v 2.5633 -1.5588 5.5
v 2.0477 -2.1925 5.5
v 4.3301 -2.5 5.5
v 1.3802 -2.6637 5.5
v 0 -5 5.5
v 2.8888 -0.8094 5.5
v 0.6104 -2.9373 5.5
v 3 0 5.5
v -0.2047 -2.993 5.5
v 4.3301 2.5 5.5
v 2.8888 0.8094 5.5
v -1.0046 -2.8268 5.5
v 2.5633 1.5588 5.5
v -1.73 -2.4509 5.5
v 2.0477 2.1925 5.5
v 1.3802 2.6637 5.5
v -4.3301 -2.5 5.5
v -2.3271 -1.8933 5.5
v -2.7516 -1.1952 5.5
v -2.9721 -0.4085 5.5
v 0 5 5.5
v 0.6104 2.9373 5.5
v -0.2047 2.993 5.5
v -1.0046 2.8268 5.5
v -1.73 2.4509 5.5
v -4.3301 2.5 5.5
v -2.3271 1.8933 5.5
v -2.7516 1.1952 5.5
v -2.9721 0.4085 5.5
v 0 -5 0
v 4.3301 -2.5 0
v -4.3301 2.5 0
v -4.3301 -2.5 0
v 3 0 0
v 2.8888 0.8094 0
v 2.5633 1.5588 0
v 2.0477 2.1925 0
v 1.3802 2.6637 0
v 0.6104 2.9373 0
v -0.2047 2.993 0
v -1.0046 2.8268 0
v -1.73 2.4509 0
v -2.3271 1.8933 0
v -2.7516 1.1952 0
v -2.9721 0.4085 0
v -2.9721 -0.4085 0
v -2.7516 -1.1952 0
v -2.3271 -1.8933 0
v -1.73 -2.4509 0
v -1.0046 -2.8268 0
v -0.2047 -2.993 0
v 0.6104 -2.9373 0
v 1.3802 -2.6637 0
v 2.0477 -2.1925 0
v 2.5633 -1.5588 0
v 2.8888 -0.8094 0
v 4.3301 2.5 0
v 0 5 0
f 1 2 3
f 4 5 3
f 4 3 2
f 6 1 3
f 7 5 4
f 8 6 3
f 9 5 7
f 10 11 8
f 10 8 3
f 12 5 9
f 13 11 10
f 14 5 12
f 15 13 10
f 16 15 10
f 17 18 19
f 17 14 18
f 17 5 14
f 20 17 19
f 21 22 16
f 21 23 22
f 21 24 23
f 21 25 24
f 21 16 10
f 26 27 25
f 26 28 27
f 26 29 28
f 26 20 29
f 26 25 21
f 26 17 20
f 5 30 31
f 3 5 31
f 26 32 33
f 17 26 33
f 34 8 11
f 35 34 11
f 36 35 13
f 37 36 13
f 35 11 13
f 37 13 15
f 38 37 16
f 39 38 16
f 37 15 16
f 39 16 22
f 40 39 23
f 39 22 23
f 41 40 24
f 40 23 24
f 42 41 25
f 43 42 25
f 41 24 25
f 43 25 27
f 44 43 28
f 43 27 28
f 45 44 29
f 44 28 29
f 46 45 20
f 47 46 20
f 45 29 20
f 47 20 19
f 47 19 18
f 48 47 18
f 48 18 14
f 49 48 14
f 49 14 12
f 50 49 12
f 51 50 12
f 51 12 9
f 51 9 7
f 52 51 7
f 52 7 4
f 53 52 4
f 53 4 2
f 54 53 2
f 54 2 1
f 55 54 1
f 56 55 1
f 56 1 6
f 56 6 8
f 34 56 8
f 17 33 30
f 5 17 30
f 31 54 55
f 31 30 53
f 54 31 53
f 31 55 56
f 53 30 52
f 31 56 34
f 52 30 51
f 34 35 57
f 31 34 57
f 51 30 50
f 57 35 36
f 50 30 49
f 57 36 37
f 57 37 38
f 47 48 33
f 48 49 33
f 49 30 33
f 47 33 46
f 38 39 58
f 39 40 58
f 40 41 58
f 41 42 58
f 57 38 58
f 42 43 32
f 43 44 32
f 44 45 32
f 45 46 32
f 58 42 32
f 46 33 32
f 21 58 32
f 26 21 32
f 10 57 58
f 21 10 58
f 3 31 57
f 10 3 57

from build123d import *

# Parameters (mm, degrees)
BOSS_EXTRUDE1_DEPTH = 5.5
CUT_EXTRUDE1_REACH  = 10.602
SKETCH2_R           = 3


with BuildPart() as part:
    # Sketch1 → Boss-Extrude1 (new body)
    with BuildSketch(Plane(origin=(0, 0, 0), x_dir=(0, 1, 0), z_dir=(0, 0, 1))):
        Polygon((5, 0), (2.5, 4.330127019), (-2.5, 4.330127019), (-5, 0), (-2.5, -4.330127019), (2.5, -4.330127019), align=None)
    extrude(amount=BOSS_EXTRUDE1_DEPTH)

    # Sketch2 → Cut-Extrude1 (cut, up to next)
    with BuildSketch(Plane.XY.offset(5.5), mode=Mode.PRIVATE) as cut_extrude1_sk1:
        Circle(SKETCH2_R)
    cut_extrude1_tool1 = extrude(cut_extrude1_sk1.sketch, amount=-CUT_EXTRUDE1_REACH, mode=Mode.PRIVATE) & part.part
    add(cut_extrude1_tool1.solids().sort_by_distance((0, 0, 5.5))[0], mode=Mode.SUBTRACT)


solid = part.part
